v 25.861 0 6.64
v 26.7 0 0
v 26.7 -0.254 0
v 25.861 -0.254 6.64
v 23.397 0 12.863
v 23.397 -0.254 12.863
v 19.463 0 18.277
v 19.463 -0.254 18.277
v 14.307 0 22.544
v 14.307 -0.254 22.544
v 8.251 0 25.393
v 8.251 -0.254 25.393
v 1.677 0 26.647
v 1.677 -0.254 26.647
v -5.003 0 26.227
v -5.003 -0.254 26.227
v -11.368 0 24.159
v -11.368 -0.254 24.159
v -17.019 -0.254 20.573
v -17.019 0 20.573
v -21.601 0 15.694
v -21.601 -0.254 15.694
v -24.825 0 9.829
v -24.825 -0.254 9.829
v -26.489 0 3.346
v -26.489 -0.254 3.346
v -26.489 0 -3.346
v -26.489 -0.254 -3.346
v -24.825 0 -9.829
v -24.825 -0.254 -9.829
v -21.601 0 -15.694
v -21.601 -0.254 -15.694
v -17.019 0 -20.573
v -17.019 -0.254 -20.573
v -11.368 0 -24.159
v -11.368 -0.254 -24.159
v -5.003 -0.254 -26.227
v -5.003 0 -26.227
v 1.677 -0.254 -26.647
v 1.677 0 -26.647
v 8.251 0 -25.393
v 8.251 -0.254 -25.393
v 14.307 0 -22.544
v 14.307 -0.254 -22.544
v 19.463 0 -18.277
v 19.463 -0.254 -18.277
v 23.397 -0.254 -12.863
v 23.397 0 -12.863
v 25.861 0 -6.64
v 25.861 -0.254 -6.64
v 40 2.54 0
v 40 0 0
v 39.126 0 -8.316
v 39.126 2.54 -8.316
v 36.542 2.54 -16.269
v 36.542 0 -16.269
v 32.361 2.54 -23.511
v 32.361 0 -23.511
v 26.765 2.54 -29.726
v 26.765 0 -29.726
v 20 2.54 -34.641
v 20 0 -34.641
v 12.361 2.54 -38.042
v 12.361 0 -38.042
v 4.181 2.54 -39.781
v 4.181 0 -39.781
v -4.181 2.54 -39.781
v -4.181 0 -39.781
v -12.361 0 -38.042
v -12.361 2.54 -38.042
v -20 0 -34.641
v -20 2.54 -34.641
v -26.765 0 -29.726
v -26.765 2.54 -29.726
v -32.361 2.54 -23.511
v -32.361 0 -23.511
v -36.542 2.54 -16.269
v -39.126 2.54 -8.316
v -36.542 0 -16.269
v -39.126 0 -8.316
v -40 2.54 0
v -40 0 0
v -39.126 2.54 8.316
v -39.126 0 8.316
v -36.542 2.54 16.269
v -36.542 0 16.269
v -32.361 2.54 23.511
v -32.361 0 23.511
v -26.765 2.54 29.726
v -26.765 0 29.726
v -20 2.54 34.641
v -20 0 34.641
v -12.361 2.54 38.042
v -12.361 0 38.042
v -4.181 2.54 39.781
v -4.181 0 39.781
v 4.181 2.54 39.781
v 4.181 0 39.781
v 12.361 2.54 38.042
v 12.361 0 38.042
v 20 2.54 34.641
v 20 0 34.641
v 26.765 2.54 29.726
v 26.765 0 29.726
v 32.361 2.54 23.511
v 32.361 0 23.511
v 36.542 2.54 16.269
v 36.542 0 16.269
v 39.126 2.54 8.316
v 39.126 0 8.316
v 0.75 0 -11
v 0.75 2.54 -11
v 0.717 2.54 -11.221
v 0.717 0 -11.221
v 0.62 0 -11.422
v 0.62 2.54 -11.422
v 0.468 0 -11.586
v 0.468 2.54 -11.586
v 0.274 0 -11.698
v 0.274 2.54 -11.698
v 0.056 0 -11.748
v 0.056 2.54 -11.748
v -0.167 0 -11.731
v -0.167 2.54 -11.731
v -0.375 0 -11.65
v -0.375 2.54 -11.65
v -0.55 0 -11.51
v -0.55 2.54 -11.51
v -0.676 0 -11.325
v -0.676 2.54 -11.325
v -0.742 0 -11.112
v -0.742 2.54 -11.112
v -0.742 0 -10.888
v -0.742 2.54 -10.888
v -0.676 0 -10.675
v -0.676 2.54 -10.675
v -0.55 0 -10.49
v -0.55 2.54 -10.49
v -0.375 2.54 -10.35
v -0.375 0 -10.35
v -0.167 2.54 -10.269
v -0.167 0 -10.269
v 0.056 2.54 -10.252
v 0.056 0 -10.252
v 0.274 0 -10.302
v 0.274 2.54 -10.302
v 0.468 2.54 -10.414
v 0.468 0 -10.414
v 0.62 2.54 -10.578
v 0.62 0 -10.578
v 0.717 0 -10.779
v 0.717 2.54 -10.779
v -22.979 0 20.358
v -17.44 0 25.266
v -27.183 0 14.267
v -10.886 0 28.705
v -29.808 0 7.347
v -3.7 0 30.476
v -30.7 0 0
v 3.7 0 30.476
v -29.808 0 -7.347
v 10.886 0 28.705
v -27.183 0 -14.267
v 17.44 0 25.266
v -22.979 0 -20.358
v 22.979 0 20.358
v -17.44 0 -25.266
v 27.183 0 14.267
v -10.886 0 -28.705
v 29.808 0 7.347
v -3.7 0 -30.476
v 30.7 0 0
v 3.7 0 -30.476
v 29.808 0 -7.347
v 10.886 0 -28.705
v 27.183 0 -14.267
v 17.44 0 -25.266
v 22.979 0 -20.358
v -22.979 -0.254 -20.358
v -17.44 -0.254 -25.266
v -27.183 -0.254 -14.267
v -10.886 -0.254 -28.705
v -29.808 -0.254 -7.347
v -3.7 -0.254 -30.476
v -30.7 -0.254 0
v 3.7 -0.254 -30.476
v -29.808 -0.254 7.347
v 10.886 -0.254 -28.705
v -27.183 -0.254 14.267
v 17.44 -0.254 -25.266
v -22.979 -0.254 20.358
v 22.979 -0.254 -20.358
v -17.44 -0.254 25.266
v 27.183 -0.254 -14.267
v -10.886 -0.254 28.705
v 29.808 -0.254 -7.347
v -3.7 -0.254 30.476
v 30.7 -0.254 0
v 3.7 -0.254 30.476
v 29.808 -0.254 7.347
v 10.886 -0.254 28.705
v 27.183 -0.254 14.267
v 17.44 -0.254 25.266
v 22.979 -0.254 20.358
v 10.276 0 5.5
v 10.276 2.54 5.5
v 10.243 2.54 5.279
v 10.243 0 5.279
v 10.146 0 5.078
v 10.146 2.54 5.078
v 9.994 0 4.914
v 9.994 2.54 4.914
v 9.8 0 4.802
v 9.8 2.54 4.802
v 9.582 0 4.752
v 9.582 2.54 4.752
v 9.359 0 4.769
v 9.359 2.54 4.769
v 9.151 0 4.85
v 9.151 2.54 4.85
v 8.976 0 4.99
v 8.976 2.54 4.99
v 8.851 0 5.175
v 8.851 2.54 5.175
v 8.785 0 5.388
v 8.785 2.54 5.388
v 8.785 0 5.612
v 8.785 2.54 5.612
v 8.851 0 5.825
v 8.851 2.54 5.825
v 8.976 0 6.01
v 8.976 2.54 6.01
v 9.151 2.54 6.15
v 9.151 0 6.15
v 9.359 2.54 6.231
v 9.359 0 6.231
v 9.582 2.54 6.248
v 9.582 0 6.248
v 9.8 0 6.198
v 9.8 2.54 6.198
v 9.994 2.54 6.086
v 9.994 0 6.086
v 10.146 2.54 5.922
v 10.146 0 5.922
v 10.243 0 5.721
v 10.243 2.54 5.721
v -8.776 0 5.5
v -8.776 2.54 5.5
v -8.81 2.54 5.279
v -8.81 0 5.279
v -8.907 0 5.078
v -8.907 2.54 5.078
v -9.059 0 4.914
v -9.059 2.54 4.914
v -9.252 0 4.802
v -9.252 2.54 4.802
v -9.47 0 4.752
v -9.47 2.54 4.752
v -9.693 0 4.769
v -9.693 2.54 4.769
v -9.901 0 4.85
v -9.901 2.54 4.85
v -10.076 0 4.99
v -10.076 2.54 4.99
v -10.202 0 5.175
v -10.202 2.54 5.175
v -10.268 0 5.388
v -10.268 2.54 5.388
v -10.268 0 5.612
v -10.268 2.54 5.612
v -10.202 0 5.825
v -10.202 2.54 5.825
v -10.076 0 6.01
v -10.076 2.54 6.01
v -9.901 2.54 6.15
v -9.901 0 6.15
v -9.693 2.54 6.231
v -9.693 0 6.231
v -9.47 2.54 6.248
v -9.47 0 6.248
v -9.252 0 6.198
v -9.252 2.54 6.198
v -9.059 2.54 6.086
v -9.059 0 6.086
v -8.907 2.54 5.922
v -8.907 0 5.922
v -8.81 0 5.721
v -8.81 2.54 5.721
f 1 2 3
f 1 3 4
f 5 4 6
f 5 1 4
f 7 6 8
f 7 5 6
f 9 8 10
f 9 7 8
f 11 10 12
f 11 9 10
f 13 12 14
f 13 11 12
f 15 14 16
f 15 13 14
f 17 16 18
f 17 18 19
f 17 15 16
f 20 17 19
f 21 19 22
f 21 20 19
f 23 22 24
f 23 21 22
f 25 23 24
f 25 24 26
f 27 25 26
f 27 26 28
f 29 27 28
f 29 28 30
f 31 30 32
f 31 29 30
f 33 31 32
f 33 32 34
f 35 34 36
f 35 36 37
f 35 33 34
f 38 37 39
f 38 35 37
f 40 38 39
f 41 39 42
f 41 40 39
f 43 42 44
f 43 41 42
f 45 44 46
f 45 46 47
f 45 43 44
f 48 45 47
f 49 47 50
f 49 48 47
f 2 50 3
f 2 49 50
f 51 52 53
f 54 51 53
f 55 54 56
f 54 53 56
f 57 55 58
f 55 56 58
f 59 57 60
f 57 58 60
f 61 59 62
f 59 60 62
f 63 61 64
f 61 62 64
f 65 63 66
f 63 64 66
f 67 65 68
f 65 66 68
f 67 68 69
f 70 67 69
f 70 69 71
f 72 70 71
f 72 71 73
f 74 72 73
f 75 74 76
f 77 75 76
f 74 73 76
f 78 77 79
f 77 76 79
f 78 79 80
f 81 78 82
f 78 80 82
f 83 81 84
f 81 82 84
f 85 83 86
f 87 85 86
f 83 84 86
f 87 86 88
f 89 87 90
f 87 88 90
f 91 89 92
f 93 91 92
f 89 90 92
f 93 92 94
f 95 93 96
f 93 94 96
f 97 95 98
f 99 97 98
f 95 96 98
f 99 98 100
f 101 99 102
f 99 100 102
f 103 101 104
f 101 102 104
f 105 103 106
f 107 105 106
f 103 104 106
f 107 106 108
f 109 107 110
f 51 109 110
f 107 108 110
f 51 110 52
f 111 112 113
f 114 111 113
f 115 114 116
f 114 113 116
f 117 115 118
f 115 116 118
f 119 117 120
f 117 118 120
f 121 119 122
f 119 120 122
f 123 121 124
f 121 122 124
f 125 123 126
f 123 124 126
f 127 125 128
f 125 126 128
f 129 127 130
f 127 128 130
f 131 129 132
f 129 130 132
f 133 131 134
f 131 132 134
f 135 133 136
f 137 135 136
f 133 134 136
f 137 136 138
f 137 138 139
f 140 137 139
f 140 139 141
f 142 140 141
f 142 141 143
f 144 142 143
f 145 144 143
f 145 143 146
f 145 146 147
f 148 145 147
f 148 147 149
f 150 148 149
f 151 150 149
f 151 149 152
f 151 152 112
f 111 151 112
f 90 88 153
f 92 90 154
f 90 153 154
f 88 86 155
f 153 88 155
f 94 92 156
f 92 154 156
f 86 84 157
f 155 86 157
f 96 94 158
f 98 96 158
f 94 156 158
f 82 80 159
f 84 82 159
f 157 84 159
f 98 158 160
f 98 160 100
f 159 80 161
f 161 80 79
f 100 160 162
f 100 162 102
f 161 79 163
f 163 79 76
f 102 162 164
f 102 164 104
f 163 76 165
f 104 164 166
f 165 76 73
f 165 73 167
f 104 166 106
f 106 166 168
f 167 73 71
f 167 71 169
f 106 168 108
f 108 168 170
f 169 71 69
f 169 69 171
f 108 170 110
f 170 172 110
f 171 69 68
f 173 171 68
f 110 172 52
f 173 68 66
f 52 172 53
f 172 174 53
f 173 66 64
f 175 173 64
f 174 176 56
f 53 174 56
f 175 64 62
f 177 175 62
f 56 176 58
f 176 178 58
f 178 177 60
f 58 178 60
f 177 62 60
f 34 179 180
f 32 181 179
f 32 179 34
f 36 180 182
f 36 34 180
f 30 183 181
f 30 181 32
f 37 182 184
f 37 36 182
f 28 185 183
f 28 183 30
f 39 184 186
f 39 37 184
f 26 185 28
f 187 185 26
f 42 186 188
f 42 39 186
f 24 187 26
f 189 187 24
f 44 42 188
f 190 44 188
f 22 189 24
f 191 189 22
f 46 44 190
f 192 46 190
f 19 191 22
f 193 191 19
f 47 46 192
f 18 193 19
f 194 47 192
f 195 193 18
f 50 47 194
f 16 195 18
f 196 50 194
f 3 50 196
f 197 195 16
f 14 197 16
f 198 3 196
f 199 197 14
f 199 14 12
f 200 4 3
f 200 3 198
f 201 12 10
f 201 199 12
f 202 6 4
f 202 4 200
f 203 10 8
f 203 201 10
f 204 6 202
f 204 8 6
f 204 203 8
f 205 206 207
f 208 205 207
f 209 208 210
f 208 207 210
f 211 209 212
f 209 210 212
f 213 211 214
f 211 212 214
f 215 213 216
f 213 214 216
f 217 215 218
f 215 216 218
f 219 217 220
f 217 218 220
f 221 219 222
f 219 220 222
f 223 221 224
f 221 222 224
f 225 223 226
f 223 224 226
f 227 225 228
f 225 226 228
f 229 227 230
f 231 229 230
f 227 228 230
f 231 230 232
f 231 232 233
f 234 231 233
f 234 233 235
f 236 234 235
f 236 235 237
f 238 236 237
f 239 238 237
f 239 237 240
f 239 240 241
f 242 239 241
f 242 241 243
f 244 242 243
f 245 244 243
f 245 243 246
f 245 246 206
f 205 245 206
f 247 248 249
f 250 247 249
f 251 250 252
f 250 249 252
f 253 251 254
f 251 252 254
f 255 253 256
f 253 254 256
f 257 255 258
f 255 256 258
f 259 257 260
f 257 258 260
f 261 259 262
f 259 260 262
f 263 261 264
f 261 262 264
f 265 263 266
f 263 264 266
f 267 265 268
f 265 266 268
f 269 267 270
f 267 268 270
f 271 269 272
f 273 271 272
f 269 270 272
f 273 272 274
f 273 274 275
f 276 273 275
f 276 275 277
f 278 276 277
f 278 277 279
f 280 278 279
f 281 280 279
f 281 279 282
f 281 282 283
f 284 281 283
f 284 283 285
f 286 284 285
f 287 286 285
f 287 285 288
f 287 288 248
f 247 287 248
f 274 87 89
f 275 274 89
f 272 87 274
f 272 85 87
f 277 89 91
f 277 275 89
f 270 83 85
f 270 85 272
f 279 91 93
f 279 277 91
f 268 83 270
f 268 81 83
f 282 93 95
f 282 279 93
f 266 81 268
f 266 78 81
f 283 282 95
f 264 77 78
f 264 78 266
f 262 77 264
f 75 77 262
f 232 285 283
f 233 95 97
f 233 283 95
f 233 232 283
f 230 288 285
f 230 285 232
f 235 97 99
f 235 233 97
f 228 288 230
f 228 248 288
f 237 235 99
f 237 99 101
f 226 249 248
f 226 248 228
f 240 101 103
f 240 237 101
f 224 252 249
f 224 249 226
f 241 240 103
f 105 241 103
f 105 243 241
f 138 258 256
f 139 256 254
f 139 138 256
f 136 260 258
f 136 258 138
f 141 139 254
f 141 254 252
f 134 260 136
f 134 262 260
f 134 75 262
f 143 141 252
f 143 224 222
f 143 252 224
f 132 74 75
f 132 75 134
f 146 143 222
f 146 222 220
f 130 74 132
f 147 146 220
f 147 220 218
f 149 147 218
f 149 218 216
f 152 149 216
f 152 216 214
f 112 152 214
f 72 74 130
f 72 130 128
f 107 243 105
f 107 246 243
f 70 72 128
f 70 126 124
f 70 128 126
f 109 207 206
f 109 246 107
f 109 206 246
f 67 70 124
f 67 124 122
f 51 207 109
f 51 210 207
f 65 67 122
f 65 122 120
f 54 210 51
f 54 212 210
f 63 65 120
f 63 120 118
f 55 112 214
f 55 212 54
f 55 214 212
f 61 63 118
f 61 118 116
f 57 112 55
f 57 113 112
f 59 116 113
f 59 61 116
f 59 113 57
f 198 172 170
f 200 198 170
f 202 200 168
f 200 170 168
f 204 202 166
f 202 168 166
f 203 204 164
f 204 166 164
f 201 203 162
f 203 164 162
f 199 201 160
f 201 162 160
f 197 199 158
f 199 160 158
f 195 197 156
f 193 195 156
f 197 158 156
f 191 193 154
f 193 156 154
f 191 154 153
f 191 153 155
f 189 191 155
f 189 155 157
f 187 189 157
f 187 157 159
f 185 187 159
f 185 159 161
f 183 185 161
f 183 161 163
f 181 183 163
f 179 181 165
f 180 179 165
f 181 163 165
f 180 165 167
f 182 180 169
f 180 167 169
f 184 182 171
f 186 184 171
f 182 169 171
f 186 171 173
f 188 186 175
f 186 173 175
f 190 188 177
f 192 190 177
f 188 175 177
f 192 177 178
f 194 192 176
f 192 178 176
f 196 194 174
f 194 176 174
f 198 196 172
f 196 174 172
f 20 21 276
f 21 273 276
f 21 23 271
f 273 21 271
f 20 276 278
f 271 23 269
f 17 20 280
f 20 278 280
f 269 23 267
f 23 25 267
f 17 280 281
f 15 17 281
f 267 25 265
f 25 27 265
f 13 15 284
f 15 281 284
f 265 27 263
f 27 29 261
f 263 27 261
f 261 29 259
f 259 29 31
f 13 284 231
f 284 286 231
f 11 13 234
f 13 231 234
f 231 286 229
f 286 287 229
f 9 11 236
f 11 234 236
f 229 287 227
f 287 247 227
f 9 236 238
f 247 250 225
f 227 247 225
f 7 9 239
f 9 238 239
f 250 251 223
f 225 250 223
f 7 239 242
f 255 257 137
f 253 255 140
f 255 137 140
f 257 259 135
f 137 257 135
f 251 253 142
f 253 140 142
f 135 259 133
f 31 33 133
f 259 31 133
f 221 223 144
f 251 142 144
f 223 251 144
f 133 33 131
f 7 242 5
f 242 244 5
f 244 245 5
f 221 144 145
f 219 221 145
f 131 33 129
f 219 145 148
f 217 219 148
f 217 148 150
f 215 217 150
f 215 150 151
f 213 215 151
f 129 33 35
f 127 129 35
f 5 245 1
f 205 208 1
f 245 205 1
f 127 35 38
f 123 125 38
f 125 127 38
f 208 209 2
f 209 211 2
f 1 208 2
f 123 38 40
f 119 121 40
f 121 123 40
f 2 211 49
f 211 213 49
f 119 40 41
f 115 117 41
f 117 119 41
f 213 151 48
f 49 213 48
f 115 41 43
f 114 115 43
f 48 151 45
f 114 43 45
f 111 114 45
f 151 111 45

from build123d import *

# Parameters (mm, degrees)
SKETCH1_R           = 40
BOSS_EXTRUDE1_DEPTH = 2.54
SKETCH2_R           = 0.75
CUT_EXTRUDE1_DEPTH  = 10
SKETCH3_R           = 30.7
SKETCH3_R_2         = 26.7
BOSS_EXTRUDE2_DEPTH = 0.254


with BuildPart() as part:
    # Sketch1 → Boss-Extrude1 (new body)
    with BuildSketch(Plane(origin=(0, 0, 0), x_dir=(1, 0, 0), z_dir=(0, 1, 0))):
        Circle(SKETCH1_R)
    extrude(amount=BOSS_EXTRUDE1_DEPTH)

    # Sketch2 → Cut-Extrude1 (cut)
    with BuildSketch(Plane(origin=(0, 2.54, 0), x_dir=(1, 0, 0), z_dir=(0, 1, 0))):
        with Locations((0, 11)):
            Circle(SKETCH2_R)
        with Locations((9.526279442, -5.5)):
            Circle(SKETCH2_R)
        with Locations((-9.526279442, -5.5)):
            Circle(SKETCH2_R)
    extrude(amount=-CUT_EXTRUDE1_DEPTH, mode=Mode.SUBTRACT)

    # Sketch3 → Boss-Extrude2 (add)
    with BuildSketch(Plane.XZ):
        Circle(SKETCH3_R)
        Circle(SKETCH3_R_2, mode=Mode.SUBTRACT)
    extrude(amount=BOSS_EXTRUDE2_DEPTH)


solid = part.part
